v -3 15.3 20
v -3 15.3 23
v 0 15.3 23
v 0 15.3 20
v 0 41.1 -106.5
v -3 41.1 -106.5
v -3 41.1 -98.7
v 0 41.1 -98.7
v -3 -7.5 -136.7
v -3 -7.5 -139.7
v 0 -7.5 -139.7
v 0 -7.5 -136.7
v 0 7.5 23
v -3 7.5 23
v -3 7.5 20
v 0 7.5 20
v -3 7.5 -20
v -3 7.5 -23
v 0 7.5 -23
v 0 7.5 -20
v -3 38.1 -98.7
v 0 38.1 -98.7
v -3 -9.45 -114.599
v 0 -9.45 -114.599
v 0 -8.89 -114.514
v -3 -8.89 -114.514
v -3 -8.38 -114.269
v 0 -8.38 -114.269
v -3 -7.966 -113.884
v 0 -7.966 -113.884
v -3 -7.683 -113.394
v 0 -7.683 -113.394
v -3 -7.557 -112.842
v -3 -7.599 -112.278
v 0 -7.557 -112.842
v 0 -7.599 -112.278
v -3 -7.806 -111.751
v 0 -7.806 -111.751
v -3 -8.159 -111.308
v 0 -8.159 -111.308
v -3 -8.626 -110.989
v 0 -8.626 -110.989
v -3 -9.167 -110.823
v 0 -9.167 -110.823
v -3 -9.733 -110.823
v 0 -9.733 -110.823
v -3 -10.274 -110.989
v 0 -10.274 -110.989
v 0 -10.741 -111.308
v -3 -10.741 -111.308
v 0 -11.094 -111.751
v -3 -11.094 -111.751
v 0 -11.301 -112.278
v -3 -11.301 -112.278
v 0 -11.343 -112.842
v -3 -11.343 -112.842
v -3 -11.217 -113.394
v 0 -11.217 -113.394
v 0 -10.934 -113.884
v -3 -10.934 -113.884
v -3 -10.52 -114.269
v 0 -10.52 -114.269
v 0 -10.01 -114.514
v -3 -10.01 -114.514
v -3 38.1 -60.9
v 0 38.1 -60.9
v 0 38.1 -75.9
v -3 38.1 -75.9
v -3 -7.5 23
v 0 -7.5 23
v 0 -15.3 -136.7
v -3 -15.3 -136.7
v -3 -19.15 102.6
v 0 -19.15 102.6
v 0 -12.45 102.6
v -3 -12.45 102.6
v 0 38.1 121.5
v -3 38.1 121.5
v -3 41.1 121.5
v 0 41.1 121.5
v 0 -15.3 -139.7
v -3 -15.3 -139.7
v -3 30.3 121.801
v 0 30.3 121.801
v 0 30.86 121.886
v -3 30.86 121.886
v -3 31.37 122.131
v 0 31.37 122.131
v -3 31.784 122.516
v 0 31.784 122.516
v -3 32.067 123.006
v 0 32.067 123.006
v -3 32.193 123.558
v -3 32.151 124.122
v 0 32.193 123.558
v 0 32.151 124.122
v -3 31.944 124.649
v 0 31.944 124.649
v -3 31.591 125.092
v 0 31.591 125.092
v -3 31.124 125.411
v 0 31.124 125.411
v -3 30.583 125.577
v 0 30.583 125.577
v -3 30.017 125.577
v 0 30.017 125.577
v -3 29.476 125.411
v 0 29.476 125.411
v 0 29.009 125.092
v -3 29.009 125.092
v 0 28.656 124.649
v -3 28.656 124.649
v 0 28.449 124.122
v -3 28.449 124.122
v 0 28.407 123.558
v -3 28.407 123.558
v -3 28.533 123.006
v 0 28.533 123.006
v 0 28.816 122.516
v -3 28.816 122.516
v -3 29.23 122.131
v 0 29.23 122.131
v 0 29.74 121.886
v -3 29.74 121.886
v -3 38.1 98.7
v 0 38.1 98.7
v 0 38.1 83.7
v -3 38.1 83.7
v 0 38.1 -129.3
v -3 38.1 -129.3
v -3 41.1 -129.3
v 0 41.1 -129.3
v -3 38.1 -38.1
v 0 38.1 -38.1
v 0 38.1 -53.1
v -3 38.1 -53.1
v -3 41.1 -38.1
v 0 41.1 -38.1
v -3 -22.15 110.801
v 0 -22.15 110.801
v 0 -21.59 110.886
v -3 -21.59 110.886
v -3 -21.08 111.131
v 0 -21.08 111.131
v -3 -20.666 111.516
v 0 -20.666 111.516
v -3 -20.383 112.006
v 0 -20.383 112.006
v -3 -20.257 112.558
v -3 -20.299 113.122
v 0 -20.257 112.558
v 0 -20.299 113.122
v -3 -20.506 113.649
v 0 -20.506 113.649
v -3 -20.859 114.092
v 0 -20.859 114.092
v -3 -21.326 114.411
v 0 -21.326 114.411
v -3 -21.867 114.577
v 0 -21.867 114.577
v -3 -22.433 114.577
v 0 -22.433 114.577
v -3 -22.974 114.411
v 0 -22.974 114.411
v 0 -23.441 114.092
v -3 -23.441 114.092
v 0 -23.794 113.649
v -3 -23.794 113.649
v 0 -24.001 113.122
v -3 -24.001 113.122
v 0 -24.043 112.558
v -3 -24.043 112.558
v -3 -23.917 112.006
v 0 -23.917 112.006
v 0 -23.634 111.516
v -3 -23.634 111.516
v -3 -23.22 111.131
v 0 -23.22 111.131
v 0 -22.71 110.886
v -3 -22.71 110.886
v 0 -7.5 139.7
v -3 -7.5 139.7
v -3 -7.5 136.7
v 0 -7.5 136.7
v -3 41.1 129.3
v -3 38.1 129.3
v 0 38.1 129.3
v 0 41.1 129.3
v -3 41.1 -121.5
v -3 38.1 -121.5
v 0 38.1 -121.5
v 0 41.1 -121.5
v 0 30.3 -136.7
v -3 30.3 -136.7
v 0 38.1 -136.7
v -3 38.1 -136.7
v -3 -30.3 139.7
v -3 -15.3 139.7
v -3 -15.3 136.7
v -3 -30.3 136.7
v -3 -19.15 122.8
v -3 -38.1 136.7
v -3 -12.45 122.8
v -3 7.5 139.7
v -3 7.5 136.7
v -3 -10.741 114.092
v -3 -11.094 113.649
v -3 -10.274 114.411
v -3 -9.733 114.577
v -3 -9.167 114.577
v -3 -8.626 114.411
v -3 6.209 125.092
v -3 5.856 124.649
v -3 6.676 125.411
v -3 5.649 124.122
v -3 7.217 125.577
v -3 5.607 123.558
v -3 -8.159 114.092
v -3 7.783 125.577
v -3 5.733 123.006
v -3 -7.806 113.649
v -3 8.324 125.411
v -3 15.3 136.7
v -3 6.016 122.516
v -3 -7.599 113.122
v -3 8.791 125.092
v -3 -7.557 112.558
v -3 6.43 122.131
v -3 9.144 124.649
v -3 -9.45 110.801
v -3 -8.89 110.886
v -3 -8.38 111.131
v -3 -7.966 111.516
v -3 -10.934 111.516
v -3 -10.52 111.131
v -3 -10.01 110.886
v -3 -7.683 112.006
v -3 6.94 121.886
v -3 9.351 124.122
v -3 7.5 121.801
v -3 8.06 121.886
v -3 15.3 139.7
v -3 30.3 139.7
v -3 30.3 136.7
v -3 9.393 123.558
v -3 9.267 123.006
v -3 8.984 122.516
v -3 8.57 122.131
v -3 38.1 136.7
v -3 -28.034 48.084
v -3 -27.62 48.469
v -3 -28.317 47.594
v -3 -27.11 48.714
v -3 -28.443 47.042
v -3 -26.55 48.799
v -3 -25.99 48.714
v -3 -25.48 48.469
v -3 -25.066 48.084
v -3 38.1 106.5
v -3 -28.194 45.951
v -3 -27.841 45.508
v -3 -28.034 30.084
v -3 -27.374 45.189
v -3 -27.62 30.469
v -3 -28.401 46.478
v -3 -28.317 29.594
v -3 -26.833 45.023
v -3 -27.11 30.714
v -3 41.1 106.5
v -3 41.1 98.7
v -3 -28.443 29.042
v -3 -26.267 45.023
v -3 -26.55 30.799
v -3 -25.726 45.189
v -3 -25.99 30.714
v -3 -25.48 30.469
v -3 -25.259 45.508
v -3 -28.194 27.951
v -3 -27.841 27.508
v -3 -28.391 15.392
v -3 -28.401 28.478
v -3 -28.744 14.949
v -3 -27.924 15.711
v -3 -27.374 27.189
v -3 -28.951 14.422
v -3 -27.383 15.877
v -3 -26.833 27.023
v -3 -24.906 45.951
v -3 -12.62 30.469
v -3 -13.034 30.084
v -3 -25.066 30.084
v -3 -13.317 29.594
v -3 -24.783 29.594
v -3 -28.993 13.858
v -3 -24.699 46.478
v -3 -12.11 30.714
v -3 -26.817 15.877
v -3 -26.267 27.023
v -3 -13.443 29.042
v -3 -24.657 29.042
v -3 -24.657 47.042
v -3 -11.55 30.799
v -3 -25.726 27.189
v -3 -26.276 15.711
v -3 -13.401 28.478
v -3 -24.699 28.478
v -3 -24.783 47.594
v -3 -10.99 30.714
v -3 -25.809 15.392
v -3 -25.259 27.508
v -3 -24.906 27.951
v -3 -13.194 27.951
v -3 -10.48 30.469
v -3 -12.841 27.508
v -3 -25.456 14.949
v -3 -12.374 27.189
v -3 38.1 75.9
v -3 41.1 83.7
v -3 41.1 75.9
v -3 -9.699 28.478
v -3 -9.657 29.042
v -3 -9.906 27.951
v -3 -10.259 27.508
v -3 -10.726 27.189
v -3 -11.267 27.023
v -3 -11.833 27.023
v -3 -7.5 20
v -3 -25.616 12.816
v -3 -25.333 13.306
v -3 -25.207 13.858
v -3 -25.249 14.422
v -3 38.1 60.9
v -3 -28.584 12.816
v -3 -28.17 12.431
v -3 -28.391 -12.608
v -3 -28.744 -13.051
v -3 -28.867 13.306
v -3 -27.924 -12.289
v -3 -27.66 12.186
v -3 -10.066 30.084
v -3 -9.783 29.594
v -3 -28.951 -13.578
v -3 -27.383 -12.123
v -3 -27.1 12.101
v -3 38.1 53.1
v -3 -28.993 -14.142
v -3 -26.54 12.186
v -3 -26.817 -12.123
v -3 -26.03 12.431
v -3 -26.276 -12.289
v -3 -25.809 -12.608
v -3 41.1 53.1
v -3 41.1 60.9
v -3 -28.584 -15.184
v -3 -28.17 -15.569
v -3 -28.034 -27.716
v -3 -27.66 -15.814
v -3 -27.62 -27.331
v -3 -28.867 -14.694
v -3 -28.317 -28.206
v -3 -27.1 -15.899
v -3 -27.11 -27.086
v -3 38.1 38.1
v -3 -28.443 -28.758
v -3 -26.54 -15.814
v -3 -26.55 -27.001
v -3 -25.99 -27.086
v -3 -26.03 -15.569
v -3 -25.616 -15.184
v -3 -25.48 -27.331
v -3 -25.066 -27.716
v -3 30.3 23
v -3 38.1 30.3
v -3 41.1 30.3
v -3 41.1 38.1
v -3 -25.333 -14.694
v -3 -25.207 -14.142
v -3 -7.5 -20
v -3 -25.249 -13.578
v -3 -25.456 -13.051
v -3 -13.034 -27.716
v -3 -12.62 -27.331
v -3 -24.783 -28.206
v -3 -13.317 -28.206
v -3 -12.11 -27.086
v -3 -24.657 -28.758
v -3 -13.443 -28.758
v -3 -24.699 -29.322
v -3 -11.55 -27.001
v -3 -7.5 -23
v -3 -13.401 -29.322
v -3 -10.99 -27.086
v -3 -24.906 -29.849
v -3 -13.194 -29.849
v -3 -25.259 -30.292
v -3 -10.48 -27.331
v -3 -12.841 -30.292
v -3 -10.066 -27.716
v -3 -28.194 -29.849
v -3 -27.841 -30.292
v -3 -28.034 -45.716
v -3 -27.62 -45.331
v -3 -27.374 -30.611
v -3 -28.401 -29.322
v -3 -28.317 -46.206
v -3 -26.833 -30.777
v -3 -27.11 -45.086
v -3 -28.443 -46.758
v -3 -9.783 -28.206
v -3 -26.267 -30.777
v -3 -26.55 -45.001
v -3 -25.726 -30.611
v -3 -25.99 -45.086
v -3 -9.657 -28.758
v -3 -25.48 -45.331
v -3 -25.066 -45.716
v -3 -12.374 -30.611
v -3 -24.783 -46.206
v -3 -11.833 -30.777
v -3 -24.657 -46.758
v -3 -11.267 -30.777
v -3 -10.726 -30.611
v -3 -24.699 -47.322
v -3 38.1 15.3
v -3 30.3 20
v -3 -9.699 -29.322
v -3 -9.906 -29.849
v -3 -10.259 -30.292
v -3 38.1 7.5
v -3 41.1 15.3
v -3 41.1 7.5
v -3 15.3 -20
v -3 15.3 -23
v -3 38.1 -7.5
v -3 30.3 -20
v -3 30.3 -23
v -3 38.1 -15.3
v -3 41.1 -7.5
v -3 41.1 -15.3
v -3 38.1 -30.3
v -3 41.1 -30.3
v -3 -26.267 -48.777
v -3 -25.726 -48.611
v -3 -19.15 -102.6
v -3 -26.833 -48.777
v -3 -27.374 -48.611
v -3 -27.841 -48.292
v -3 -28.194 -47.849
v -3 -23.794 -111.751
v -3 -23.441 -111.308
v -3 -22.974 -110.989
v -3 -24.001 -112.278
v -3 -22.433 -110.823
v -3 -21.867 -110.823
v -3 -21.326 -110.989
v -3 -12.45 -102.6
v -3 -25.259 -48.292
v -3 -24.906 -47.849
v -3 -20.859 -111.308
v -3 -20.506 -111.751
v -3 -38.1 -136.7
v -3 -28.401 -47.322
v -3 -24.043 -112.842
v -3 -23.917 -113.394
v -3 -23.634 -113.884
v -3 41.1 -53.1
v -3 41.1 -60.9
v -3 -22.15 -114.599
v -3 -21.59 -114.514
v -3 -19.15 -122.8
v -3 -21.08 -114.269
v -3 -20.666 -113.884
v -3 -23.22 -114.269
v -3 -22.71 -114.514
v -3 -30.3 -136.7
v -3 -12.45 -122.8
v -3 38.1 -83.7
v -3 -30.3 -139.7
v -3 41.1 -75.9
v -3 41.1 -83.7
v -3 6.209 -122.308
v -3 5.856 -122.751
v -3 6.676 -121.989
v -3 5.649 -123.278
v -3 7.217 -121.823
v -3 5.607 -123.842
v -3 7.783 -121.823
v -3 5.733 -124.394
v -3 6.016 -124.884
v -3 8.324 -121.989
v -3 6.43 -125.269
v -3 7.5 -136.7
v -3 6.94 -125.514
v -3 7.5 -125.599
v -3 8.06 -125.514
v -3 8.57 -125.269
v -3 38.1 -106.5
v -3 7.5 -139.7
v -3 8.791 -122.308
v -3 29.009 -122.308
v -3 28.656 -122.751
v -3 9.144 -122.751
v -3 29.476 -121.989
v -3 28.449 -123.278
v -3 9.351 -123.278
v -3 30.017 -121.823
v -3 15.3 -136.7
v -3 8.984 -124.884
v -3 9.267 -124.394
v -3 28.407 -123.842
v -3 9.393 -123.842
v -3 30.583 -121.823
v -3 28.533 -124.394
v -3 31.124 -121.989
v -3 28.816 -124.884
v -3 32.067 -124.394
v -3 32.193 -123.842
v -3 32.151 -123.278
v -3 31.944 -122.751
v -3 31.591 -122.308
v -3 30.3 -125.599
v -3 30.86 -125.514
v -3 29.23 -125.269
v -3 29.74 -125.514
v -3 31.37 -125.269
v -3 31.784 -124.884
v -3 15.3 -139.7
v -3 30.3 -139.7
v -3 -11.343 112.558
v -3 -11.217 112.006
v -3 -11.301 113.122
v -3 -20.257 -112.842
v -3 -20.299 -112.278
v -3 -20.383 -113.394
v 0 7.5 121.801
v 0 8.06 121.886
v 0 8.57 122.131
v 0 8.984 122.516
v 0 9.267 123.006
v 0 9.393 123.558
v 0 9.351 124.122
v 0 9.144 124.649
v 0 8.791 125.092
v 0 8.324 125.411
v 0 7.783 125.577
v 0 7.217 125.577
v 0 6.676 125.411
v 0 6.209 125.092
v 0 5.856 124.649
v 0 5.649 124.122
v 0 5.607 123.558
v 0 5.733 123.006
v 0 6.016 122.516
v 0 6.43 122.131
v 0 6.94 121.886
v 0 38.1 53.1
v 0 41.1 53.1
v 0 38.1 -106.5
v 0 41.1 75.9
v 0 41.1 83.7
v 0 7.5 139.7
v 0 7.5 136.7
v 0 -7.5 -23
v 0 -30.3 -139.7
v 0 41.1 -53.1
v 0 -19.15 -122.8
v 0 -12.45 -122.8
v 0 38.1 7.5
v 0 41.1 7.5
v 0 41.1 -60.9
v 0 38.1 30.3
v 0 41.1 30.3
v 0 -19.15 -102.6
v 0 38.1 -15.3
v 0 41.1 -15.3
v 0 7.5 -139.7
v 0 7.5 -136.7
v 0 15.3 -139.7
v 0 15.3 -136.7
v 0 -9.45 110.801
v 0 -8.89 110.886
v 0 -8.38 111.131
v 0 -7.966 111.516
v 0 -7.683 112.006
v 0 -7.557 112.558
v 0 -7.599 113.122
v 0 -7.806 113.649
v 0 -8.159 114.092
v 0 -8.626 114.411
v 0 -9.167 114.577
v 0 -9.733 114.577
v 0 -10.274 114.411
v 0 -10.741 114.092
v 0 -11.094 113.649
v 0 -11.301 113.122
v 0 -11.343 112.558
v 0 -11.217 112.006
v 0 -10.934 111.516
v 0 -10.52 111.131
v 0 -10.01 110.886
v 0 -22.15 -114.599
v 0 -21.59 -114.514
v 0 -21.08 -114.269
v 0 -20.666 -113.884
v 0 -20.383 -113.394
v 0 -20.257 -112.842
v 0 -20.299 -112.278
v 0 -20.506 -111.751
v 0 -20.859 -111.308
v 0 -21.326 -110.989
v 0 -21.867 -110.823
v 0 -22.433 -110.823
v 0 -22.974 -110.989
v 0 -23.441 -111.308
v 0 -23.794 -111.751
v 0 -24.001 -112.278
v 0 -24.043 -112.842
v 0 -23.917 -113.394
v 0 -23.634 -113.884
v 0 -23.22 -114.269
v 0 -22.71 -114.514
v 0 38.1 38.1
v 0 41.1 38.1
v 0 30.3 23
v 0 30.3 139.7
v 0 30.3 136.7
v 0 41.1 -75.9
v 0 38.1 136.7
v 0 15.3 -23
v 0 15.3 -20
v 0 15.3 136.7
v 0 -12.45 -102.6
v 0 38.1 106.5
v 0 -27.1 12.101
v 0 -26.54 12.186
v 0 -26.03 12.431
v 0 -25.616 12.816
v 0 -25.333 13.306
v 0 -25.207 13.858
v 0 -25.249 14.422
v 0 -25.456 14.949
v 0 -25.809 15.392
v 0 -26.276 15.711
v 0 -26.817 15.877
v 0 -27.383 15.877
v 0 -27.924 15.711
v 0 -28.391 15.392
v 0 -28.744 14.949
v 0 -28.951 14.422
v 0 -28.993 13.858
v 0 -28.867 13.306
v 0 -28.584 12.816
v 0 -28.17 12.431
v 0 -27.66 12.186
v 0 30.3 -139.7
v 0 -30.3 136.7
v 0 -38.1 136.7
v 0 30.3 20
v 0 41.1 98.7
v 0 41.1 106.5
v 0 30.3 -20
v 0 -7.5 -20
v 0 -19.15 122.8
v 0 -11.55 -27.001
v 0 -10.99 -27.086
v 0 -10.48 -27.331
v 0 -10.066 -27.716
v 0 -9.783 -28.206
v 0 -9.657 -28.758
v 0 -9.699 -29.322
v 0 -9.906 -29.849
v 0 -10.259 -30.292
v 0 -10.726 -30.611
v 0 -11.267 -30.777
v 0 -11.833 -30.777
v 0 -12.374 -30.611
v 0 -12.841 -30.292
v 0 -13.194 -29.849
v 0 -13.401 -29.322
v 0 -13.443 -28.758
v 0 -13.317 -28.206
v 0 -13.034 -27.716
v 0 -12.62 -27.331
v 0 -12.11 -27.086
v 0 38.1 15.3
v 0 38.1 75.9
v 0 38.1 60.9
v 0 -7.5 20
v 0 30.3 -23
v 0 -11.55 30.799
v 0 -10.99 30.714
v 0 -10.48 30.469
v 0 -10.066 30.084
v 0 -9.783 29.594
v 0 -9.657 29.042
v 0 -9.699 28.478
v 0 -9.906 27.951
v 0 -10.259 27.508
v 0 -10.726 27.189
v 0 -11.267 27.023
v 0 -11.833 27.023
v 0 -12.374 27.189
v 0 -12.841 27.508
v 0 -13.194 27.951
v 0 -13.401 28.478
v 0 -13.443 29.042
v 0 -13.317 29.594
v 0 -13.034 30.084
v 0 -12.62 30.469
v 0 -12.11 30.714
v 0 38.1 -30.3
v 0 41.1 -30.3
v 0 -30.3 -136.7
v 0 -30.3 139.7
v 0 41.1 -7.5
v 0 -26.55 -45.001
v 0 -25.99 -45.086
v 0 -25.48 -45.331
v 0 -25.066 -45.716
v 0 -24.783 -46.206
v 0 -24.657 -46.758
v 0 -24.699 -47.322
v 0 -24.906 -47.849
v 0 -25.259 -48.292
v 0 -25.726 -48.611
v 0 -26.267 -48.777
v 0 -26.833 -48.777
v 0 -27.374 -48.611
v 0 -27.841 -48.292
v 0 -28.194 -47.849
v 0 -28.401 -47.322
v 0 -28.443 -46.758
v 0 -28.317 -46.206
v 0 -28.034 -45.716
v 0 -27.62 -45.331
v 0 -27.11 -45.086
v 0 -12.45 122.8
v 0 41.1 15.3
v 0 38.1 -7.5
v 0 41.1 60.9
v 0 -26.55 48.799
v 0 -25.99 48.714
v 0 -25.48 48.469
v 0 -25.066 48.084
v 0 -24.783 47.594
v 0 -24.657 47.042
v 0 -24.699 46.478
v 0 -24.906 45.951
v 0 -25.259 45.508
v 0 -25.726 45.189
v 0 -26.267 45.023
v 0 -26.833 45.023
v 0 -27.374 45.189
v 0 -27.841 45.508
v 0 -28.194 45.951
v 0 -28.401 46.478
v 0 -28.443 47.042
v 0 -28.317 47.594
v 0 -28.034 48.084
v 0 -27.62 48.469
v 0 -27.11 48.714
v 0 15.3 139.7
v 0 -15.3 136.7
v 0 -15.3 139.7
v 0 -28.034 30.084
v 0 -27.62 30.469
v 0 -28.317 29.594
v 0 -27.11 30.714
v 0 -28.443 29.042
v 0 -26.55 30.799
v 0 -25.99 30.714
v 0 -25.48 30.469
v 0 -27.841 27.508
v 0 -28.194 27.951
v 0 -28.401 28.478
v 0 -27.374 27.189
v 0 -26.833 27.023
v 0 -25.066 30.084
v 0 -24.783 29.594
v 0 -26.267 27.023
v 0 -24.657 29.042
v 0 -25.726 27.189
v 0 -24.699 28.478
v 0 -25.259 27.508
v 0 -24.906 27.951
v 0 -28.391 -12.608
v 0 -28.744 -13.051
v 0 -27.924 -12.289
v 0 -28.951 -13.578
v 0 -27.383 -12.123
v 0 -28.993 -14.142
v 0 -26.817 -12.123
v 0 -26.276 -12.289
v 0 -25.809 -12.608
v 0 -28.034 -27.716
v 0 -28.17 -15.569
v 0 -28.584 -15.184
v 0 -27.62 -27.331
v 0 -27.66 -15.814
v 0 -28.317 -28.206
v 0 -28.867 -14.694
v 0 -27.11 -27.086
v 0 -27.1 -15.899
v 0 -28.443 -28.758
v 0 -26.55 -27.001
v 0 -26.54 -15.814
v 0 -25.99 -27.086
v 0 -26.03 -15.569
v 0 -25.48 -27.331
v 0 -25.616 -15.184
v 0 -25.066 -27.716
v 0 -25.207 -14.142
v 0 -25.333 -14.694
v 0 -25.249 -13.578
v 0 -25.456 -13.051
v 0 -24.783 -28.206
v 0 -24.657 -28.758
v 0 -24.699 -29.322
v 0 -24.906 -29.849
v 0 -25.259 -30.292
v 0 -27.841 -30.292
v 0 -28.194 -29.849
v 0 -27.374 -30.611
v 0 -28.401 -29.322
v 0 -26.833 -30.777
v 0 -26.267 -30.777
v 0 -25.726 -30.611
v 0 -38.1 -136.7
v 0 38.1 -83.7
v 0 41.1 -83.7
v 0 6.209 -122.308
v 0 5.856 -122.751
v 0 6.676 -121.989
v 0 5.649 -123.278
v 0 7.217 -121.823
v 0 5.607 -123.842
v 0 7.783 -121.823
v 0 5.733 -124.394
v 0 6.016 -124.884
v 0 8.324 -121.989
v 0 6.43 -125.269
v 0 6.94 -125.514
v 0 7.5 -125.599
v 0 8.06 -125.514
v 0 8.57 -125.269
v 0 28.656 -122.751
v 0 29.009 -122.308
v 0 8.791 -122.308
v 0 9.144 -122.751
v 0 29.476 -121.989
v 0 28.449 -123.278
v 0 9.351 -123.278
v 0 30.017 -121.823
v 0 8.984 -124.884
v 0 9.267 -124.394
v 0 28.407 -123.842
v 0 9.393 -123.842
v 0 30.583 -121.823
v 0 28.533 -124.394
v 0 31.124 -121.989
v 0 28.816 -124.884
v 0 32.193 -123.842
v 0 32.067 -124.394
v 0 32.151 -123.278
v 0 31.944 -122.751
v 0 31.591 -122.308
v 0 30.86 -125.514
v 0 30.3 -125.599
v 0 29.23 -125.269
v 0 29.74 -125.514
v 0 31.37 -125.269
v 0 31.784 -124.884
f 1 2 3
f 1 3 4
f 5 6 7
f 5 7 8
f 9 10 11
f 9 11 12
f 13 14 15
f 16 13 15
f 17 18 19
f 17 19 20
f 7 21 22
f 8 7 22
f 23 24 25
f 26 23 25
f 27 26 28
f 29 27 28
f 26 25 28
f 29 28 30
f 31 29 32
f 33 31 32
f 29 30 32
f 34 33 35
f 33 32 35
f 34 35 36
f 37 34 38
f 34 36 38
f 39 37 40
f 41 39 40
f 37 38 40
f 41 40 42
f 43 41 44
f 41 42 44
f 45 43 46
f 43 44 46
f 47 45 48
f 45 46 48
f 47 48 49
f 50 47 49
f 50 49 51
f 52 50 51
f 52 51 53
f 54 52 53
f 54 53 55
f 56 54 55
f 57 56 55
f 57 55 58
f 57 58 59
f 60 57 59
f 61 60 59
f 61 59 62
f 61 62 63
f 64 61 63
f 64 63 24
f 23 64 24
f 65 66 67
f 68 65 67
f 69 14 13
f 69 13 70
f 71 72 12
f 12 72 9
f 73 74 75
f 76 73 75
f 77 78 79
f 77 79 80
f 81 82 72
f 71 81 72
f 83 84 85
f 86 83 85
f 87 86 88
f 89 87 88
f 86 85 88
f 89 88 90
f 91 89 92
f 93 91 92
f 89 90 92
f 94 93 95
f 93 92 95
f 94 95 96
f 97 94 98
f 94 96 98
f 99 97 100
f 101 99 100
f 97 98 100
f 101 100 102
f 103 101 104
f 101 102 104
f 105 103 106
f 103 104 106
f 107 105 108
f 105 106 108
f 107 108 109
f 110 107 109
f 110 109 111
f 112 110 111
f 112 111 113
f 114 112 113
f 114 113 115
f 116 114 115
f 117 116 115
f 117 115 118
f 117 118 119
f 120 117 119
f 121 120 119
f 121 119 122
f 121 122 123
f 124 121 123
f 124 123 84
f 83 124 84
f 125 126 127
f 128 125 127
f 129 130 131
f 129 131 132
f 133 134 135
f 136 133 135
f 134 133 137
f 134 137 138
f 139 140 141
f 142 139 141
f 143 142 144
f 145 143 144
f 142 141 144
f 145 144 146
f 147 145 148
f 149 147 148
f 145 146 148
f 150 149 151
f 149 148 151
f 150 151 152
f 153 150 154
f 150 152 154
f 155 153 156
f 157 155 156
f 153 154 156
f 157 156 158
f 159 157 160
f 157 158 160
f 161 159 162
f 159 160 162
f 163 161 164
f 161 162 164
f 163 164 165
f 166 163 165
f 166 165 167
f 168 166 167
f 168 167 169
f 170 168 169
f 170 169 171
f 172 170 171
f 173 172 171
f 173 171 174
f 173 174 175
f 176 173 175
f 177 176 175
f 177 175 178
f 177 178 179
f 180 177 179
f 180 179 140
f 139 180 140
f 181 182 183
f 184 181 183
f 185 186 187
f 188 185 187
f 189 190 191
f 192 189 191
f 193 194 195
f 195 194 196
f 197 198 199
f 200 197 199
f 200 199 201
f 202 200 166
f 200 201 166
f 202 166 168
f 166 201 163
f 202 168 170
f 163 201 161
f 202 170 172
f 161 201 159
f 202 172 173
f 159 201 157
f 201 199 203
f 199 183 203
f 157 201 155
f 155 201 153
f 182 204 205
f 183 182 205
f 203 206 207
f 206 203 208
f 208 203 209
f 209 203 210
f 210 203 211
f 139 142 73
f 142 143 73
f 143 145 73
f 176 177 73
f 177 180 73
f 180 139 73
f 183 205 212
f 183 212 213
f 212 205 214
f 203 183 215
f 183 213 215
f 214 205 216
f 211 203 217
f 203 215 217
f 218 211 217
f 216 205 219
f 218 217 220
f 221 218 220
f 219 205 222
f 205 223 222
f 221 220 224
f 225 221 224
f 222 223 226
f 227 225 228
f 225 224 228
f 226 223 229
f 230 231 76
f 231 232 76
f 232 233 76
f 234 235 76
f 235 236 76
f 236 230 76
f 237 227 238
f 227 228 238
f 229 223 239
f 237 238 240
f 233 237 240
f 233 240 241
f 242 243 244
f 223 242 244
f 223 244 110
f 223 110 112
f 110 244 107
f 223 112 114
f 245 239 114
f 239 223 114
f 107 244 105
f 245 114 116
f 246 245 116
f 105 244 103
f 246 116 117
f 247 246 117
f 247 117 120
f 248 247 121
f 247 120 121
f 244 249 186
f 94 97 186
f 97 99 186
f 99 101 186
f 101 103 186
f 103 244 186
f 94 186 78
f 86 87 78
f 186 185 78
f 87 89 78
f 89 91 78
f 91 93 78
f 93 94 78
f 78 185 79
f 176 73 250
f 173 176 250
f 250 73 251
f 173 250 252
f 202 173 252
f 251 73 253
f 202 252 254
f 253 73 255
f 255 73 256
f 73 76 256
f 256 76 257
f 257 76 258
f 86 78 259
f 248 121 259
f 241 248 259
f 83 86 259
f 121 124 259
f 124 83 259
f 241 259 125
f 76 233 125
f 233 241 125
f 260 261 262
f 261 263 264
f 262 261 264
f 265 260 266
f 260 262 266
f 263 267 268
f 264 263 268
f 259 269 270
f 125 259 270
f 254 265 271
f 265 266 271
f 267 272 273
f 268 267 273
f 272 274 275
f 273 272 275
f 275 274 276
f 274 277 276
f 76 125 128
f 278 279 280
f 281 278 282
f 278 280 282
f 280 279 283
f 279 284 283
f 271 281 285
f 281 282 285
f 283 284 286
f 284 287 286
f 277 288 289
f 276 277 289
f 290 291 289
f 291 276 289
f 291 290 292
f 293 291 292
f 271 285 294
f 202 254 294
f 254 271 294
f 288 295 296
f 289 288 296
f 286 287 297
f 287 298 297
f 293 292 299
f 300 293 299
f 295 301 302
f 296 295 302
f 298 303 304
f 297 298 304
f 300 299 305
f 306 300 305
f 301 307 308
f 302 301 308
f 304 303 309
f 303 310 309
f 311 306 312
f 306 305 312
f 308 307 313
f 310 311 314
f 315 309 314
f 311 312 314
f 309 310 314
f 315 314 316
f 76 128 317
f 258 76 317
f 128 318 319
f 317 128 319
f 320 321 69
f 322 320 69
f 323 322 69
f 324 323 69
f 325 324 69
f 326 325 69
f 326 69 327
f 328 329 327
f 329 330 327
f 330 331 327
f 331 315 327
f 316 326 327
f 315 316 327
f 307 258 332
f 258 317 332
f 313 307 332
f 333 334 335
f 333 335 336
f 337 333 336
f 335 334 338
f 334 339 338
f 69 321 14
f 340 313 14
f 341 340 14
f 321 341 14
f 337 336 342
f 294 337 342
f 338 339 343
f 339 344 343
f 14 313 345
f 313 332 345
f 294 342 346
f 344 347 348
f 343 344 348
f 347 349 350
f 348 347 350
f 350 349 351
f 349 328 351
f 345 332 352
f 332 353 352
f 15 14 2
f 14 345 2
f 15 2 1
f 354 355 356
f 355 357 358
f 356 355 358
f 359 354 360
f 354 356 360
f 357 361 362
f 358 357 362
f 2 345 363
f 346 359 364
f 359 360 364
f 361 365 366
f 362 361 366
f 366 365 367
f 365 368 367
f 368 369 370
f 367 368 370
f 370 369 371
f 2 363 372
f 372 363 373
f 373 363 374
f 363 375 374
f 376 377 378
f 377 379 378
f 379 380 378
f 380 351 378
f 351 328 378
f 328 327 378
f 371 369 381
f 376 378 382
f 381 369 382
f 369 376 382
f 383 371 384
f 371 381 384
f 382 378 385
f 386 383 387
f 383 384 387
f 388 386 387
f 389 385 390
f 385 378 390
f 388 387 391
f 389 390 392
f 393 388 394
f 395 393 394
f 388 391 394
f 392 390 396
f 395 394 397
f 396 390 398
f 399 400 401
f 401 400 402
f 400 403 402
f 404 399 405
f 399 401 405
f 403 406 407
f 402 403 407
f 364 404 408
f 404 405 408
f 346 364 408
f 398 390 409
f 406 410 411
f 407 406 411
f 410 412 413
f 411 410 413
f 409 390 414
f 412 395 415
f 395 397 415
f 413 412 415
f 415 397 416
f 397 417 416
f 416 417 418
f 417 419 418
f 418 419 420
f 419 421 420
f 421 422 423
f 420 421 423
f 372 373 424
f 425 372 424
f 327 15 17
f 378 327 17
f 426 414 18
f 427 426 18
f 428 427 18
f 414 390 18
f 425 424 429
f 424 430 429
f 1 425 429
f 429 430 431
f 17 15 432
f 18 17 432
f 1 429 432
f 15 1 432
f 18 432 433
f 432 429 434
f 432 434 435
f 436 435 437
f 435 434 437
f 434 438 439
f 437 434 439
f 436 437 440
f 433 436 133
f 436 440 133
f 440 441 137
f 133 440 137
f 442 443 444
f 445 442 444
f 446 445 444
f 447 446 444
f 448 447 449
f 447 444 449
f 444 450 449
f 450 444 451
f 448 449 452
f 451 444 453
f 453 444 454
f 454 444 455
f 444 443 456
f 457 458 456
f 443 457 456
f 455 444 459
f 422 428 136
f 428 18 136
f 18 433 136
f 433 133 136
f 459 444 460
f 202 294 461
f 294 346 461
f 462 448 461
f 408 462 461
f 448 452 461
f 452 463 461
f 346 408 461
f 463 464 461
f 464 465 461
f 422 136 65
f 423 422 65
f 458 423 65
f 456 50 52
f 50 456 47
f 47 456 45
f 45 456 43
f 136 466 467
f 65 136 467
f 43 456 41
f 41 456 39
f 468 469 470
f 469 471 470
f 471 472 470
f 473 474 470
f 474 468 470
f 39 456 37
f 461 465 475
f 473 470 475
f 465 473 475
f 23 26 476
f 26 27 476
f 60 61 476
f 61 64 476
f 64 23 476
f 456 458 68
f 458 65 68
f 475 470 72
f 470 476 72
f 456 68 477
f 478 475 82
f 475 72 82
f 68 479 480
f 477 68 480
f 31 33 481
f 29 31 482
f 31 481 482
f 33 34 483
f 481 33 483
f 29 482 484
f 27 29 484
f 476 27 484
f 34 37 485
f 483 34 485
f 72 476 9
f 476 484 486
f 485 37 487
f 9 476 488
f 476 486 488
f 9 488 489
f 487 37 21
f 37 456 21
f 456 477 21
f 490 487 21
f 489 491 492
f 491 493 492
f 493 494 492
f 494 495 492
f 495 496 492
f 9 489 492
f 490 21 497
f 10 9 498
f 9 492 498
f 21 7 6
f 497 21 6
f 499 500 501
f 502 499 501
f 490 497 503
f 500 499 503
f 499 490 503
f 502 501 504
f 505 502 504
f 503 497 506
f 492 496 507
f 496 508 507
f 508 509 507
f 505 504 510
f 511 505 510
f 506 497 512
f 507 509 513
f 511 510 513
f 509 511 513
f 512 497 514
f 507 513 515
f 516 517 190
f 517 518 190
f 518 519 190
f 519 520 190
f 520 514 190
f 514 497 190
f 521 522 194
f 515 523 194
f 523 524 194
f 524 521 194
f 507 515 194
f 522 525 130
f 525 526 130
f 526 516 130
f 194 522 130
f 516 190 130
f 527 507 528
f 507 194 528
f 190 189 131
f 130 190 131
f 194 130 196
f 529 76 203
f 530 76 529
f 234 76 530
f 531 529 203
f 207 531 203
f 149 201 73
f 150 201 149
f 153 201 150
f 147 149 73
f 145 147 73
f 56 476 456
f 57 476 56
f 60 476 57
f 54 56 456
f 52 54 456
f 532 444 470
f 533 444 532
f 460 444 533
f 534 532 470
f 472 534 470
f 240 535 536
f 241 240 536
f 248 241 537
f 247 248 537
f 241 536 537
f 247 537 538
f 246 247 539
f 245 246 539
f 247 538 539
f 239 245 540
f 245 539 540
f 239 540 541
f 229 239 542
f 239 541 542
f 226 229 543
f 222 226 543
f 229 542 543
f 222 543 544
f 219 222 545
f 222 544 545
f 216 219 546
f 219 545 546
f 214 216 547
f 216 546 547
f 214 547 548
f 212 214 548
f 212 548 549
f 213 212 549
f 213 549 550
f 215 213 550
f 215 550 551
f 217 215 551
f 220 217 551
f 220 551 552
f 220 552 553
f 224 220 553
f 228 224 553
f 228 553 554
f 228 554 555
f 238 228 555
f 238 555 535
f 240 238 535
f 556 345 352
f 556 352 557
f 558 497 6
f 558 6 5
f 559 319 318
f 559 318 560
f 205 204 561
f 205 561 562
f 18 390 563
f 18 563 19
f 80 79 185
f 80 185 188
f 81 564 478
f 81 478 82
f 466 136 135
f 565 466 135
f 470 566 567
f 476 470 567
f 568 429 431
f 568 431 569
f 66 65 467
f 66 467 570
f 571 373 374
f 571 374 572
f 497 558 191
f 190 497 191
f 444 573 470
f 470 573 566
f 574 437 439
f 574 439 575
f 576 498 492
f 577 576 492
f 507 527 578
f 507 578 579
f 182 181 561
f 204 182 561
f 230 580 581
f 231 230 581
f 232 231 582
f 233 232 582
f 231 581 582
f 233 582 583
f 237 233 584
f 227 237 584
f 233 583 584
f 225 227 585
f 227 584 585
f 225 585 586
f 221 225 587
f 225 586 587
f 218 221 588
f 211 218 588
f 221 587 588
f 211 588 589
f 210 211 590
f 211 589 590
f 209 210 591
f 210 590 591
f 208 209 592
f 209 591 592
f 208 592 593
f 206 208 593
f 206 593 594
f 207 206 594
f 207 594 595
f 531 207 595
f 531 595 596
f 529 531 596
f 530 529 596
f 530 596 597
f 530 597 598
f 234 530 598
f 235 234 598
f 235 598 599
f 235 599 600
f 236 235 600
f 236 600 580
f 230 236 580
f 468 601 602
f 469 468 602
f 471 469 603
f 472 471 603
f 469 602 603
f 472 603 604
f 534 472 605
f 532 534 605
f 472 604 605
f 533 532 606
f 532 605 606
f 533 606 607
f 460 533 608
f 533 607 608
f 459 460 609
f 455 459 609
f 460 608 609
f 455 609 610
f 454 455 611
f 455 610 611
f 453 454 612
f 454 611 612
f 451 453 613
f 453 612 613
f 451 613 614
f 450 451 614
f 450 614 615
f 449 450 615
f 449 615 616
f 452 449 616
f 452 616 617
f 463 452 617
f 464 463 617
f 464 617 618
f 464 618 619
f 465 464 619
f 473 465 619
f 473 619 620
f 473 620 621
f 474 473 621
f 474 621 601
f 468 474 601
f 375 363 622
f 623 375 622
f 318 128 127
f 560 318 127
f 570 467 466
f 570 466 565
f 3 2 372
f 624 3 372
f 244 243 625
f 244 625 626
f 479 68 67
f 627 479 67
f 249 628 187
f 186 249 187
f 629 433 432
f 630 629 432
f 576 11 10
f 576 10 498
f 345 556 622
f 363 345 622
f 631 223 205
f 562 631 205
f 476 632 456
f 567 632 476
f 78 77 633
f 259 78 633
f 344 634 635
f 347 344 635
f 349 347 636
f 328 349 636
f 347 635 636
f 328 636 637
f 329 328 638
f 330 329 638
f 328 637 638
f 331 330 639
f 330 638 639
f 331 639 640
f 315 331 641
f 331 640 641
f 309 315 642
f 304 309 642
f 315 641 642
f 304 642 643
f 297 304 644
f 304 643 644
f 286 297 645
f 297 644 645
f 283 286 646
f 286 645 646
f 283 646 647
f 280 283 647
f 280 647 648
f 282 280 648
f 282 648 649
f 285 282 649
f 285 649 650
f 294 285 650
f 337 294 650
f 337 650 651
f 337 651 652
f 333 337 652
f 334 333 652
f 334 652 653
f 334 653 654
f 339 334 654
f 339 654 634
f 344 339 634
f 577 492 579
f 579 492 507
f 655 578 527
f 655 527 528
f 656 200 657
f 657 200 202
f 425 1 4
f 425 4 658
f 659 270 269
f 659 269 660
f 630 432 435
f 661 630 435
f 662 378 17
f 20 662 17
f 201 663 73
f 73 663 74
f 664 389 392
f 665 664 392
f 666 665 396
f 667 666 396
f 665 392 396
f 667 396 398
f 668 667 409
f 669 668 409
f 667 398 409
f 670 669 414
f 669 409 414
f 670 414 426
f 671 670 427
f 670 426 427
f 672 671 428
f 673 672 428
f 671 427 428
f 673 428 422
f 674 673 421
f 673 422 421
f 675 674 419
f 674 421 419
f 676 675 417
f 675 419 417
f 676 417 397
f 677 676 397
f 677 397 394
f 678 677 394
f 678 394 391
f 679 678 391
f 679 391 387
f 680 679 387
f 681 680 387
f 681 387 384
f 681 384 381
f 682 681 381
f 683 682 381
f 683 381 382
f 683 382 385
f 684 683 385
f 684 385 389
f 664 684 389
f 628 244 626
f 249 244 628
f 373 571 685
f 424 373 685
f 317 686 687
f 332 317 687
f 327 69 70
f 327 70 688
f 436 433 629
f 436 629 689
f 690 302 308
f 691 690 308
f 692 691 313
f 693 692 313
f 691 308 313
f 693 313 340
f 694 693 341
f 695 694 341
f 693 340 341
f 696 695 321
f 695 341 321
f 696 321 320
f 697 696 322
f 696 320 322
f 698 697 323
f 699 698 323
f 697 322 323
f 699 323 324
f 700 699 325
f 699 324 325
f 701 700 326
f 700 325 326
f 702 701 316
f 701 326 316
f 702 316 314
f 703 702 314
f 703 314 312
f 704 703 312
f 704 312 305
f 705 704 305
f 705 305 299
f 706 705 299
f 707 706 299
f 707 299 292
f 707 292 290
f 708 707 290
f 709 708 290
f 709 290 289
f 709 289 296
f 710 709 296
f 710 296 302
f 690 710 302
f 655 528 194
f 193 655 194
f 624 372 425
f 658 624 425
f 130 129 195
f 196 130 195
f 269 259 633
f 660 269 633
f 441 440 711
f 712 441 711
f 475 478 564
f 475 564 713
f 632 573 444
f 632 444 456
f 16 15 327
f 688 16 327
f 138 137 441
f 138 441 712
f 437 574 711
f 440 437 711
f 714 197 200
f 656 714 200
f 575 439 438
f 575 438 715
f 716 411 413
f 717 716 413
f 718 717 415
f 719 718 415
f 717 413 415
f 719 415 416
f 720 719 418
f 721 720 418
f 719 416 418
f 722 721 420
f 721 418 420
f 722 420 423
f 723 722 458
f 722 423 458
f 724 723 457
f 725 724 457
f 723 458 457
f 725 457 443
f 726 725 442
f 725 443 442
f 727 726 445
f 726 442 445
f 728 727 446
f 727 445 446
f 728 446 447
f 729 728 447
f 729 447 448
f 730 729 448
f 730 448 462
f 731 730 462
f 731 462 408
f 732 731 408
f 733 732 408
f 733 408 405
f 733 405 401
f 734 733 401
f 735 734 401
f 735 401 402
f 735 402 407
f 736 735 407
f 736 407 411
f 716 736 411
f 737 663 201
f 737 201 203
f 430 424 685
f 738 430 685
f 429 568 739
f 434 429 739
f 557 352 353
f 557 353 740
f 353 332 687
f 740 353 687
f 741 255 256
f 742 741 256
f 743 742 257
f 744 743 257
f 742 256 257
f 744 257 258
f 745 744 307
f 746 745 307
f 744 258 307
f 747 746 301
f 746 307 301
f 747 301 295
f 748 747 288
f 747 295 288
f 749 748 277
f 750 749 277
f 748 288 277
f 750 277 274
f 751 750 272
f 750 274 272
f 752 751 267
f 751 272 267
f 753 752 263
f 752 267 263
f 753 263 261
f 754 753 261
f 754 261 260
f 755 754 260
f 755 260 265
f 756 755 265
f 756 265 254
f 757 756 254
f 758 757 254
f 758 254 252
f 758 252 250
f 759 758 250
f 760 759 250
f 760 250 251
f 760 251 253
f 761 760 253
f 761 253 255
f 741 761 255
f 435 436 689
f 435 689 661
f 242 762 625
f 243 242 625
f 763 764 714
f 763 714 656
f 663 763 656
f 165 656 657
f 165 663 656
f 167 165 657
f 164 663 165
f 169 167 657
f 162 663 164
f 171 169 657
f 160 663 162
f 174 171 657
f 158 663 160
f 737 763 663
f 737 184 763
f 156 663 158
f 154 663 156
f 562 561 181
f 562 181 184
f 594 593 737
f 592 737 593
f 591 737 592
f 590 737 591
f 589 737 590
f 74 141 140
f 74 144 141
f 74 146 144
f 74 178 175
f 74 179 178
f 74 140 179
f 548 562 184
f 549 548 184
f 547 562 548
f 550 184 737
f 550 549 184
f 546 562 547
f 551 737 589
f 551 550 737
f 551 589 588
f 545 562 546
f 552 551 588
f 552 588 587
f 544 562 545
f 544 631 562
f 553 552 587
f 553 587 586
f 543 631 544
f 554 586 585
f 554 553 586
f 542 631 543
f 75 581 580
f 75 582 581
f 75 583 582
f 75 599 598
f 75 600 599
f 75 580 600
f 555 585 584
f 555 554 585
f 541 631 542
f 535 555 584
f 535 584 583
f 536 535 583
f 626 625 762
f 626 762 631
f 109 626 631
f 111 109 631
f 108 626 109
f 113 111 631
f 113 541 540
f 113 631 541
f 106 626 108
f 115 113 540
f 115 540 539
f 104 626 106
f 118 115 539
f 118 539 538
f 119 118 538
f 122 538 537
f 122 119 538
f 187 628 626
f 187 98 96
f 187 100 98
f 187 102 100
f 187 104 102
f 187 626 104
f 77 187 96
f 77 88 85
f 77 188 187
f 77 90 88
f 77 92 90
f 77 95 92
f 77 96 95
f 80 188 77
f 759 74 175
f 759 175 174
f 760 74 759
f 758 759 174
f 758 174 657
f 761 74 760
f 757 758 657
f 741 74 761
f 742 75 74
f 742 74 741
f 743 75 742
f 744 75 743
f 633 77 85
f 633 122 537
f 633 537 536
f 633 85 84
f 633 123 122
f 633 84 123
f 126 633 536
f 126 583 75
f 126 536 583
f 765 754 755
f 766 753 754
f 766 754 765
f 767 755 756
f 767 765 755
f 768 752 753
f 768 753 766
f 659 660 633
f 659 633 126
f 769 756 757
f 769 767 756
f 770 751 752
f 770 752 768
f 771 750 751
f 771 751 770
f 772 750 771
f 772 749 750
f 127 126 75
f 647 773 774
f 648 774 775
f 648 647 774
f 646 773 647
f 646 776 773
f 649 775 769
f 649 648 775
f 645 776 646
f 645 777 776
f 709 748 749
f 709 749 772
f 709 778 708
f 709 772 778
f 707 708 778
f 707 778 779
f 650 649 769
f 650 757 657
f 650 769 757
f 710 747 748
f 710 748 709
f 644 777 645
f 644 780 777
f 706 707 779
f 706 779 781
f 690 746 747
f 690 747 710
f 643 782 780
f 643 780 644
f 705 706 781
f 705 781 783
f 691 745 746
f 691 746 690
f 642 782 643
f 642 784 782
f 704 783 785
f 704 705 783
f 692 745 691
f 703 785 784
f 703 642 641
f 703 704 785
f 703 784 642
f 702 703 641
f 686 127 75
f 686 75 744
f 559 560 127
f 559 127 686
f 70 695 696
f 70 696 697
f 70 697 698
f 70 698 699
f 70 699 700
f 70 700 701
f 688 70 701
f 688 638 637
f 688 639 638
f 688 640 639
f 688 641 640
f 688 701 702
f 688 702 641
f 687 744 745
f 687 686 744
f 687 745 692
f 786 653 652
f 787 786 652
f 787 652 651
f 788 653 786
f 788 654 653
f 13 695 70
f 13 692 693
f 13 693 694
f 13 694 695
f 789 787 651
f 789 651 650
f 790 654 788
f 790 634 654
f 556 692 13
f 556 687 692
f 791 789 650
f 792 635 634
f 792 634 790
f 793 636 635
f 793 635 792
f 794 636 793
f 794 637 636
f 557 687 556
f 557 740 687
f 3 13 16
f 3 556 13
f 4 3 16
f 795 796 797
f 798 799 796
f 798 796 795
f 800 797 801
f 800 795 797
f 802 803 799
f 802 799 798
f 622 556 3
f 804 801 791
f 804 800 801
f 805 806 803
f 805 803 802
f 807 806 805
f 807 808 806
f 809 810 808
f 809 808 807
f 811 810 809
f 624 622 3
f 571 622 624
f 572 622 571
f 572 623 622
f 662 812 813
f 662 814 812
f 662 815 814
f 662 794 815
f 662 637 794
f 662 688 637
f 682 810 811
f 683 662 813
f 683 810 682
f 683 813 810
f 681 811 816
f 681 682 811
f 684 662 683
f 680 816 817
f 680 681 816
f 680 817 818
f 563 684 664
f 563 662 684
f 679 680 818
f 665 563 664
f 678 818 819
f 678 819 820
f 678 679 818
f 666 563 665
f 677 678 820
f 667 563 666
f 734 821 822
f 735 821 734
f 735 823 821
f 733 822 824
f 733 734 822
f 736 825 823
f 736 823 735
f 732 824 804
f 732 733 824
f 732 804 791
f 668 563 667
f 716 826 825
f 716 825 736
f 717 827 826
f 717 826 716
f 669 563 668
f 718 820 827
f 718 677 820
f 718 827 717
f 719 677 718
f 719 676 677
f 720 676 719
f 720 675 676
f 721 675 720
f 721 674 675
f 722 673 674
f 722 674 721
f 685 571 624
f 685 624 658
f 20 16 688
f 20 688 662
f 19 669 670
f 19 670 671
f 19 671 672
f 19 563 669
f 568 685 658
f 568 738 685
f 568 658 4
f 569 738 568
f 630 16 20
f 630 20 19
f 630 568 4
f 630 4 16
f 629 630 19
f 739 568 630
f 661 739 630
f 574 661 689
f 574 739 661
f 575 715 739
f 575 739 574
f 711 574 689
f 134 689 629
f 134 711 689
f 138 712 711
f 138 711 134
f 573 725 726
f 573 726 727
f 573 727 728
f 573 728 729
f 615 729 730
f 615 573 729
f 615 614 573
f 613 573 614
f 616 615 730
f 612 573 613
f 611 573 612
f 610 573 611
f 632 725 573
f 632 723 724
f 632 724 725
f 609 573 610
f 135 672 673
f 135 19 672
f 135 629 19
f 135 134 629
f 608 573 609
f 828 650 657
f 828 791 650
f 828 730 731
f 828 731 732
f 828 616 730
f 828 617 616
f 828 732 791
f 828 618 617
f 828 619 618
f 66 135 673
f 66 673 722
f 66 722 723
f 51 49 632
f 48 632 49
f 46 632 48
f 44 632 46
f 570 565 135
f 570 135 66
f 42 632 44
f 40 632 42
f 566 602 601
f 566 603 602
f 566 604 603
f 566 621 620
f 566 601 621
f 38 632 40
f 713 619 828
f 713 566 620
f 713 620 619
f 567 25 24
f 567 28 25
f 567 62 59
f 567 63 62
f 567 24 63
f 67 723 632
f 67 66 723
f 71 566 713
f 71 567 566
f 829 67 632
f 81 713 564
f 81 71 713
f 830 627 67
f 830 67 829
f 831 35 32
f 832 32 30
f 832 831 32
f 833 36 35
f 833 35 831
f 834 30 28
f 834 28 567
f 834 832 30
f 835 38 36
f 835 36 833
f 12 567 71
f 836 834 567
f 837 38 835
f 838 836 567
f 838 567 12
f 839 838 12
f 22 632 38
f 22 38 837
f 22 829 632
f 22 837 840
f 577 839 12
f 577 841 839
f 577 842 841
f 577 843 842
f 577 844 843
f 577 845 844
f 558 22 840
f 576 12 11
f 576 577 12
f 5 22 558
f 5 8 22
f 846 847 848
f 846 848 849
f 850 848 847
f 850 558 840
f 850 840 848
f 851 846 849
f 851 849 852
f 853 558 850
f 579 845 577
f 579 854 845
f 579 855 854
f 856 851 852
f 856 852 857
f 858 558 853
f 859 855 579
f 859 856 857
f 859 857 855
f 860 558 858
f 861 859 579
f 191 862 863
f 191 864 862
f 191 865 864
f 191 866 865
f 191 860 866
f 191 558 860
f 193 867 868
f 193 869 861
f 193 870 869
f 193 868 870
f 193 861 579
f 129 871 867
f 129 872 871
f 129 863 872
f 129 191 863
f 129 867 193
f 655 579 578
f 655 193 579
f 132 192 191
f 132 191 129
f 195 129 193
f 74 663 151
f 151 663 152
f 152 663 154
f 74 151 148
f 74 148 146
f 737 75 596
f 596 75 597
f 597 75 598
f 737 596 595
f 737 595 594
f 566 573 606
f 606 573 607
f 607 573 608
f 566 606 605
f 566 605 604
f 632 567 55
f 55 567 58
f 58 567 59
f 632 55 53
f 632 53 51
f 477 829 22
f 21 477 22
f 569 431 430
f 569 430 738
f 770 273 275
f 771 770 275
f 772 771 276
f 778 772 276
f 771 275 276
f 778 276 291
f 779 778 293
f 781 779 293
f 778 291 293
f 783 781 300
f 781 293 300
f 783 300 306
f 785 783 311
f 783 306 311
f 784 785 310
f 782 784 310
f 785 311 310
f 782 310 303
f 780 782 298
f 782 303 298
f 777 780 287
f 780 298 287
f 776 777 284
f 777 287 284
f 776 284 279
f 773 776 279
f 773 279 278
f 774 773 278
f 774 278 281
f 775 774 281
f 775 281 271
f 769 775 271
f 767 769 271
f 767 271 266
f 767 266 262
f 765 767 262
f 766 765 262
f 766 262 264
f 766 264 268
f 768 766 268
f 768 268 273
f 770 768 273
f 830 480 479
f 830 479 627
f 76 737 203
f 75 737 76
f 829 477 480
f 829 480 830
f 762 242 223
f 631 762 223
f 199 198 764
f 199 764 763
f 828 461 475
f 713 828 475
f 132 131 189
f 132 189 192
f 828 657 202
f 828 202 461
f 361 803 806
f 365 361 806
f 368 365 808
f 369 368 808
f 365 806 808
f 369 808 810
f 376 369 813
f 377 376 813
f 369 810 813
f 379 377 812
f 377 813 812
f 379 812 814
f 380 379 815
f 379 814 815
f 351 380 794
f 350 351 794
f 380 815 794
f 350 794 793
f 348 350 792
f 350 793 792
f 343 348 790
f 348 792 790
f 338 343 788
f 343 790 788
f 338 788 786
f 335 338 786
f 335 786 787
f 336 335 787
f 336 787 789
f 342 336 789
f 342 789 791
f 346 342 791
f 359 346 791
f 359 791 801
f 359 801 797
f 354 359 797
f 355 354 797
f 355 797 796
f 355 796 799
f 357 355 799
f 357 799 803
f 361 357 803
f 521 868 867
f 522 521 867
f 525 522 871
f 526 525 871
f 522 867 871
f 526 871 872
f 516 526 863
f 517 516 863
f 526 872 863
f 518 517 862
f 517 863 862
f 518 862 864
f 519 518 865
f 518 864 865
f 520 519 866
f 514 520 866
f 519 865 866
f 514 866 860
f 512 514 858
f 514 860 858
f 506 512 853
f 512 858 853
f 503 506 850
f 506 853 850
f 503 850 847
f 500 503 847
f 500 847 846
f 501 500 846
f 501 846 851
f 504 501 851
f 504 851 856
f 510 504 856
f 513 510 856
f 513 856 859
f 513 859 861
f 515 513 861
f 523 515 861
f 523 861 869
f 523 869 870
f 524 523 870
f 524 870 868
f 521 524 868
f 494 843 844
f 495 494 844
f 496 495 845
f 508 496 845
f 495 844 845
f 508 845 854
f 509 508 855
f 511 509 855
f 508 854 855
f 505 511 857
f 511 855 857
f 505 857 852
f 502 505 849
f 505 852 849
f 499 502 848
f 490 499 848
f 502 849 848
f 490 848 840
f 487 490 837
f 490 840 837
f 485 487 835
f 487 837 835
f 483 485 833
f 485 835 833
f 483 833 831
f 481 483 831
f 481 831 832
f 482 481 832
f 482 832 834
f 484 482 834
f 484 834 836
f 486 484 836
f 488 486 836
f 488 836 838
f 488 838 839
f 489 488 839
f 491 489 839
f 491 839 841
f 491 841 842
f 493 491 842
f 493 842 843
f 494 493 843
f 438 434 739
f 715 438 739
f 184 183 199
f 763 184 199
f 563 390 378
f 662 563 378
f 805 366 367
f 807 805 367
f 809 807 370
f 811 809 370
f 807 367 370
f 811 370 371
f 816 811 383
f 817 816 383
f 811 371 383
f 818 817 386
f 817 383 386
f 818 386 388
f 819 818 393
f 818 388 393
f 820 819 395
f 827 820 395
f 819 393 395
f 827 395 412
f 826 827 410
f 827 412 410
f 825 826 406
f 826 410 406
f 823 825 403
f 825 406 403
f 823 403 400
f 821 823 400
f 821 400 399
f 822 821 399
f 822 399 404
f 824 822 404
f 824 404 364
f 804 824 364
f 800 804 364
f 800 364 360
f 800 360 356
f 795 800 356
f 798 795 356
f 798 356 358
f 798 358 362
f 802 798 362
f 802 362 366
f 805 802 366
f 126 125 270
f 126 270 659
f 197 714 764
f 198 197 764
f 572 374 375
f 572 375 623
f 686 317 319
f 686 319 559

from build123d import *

# Parameters (mm, degrees)
SKETCH1_W               = 279.4
SKETCH1_H               = 76.2
BOSS_EXTRUDE1_DEPTH     = 3
SKETCH3_W               = 3
SKETCH3_H               = 7.8
CUT_EXTRUDE1_DEPTH      = 145.833352512
LPATTERN1_COUNT         = 4
LPATTERN1_PITCH         = 22.8
MIRROR1_COPY_1_SKETCH_W = 3
MIRROR1_COPY_1_SKETCH_H = 7.8
MIRROR1_COPY_1_DEPTH    = 145.833352512
MIRROR1_COPY_2_SKETCH_W = 3
MIRROR1_COPY_2_SKETCH_H = 7.8
MIRROR1_COPY_2_DEPTH    = 145.833352512
MIRROR1_COPY_3_SKETCH_W = 3
MIRROR1_COPY_3_SKETCH_H = 7.8
MIRROR1_COPY_3_DEPTH    = 145.833352512
SKETCH5_W               = 3
SKETCH5_H               = 15
CUT_EXTRUDE3_DEPTH      = 10
SKETCH9_W               = 3
SKETCH9_H               = 7.8
BOSS_EXTRUDE2_DEPTH     = 3
LPATTERN4_COUNT         = 12
LPATTERN4_PITCH         = 22.8
LPATTERN5_COUNT         = 2
LPATTERN5_PITCH         = 22.8
MIRROR2_COPY_1_SKETCH_W = 3
MIRROR2_COPY_1_SKETCH_H = 15
MIRROR2_COPY_1_DEPTH    = 10
F_6_CLEARANCE_HOLE1_D   = 3.7973
CUT_EXTRUDE4_REACH      = 147.651
SKETCH12_W              = 20.2
SKETCH12_H              = 6.7
F_6_CLEARANCE_HOLE2_D   = 3.7973
F_6_CLEARANCE_HOLE3_D   = 3.7973
F_6_CLEARANCE_HOLE4_D   = 3.7973


with BuildPart() as part:
    # Sketch1 → Boss-Extrude1 (new body)
    with BuildSketch(Plane(origin=(0, 0, 0), x_dir=(0, 0, -1), z_dir=(1, 0, 0))):
        Rectangle(SKETCH1_W, SKETCH1_H)
    extrude(amount=-BOSS_EXTRUDE1_DEPTH)

    # Sketch3 → Cut-Extrude1 (cut, through all)
    with BuildSketch(Plane.ZY.offset(3)):
        with Locations((-138.2, 34.2)):
            Rectangle(SKETCH3_W, SKETCH3_H)
    cut_extrude1 = extrude(amount=-CUT_EXTRUDE1_DEPTH, mode=Mode.SUBTRACT)

    # LPattern1: Cut-Extrude1 ×4
    with Locations(*[(0, -i * LPATTERN1_PITCH, 0) for i in range(1, LPATTERN1_COUNT)]):
        add(cut_extrude1, mode=Mode.SUBTRACT)

    # Mirror1: Cut-Extrude1 across plane
    add(cut_extrude1.mirror(Plane.XY), mode=Mode.SUBTRACT)

    # Mirror1 copy 1 sketch → Mirror1 copy 1 (cut, through all)
    with BuildSketch(Plane(origin=(-3, -22.8, 0), x_dir=(0, 0, -1), z_dir=(-1, 0, 0))):
        with Locations((-138.2, -34.2)):
            Rectangle(MIRROR1_COPY_1_SKETCH_W, MIRROR1_COPY_1_SKETCH_H)
    extrude(amount=-MIRROR1_COPY_1_DEPTH, mode=Mode.SUBTRACT)

    # Mirror1 copy 2 sketch → Mirror1 copy 2 (cut, through all)
    with BuildSketch(Plane(origin=(-3, -45.6, 0), x_dir=(0, 0, -1), z_dir=(-1, 0, 0))):
        with Locations((-138.2, -34.2)):
            Rectangle(MIRROR1_COPY_2_SKETCH_W, MIRROR1_COPY_2_SKETCH_H)
    extrude(amount=-MIRROR1_COPY_2_DEPTH, mode=Mode.SUBTRACT)

    # Mirror1 copy 3 sketch → Mirror1 copy 3 (cut, through all)
    with BuildSketch(Plane(origin=(-3, -68.4, 0), x_dir=(0, 0, -1), z_dir=(-1, 0, 0))):
        with Locations((-138.2, -34.2)):
            Rectangle(MIRROR1_COPY_3_SKETCH_W, MIRROR1_COPY_3_SKETCH_H)
    extrude(amount=-MIRROR1_COPY_3_DEPTH, mode=Mode.SUBTRACT)

    # Sketch5 → Cut-Extrude3 (cut)
    with BuildSketch(Plane.ZY.offset(3)):
        with Locations((-21.5, 22.8)):
            Rectangle(SKETCH5_W, SKETCH5_H)
    cut_extrude3 = extrude(amount=-CUT_EXTRUDE3_DEPTH, mode=Mode.SUBTRACT)

    # Sketch9 → Boss-Extrude2 (add)
    with BuildSketch(Plane(origin=(0, 38.1, 0), x_dir=(1, 0, 0), z_dir=(0, 1, 0))):
        with Locations((-1.5, 125.4)):
            Rectangle(SKETCH9_W, SKETCH9_H)
    boss_extrude2 = extrude(amount=BOSS_EXTRUDE2_DEPTH)

    # LPattern4: Boss-Extrude2 ×12
    with Locations(*[(0, 0, i * LPATTERN4_PITCH) for i in range(1, LPATTERN4_COUNT)]):
        add(boss_extrude2)

    # LPattern5: Cut-Extrude3 ×2
    with Locations(*[(0, -i * LPATTERN5_PITCH, 0) for i in range(1, LPATTERN5_COUNT)]):
        add(cut_extrude3, mode=Mode.SUBTRACT)

    # Mirror2: Cut-Extrude3 across plane
    add(cut_extrude3.mirror(Plane.XY), mode=Mode.SUBTRACT)

    # Mirror2 copy 1 sketch → Mirror2 copy 1 (cut)
    with BuildSketch(Plane(origin=(-3, -22.8, 0), x_dir=(0, 0, -1), z_dir=(-1, 0, 0))):
        with Locations((-21.5, -22.8)):
            Rectangle(MIRROR2_COPY_1_SKETCH_W, MIRROR2_COPY_1_SKETCH_H)
    extrude(amount=-MIRROR2_COPY_1_DEPTH, mode=Mode.SUBTRACT)

    # #6 Clearance Hole1 (through all)
    with Locations(Plane(origin=(0, 0, 0), x_dir=(0, 0, -1), z_dir=(1, 0, 0))):
        with Locations((-28.9, -11.55), (-28.9, -26.55), (28.9, -26.55), (28.9, -11.55), (-46.9, -26.55), (46.9, -26.55)):
            Hole(F_6_CLEARANCE_HOLE1_D / 2)

    # Sketch12 → Cut-Extrude4 (cut, up to next)
    with BuildSketch(Plane(origin=(0, 0, 0), x_dir=(0, 0, -1), z_dir=(1, 0, 0)), mode=Mode.PRIVATE) as cut_extrude4_sk1:
        with Locations((-112.7, -15.8)):
            Rectangle(SKETCH12_W, SKETCH12_H)
    cut_extrude4_tool1 = extrude(cut_extrude4_sk1.sketch, amount=-CUT_EXTRUDE4_REACH, mode=Mode.PRIVATE) & part.part
    # Sketch12 → Cut-Extrude4 (cut, up to next)
    with BuildSketch(Plane(origin=(0, 0, 0), x_dir=(0, 0, -1), z_dir=(1, 0, 0)), mode=Mode.PRIVATE) as cut_extrude4_sk2:
        with Locations((112.7, -15.8)):
            Rectangle(SKETCH12_W, SKETCH12_H)
    cut_extrude4_tool2 = extrude(cut_extrude4_sk2.sketch, amount=-CUT_EXTRUDE4_REACH, mode=Mode.PRIVATE) & part.part
    add(cut_extrude4_tool1.solids().sort_by_distance((0, -15.8, 112.7))[0], mode=Mode.SUBTRACT)
    add(cut_extrude4_tool2.solids().sort_by_distance((0, -15.8, -112.7))[0], mode=Mode.SUBTRACT)

    # #6 Clearance Hole2 (through all)
    with Locations(Plane.ZY.offset(3)):
        with Locations((-112.7, -9.45), (-112.7, -22.15), (112.7, -22.15), (112.7, -9.45)):
            Hole(F_6_CLEARANCE_HOLE2_D / 2)

    # #6 Clearance Hole3 (through all)
    with Locations(Plane.ZY.offset(3)):
        with Locations((14, -27.1), (-14, -27.1)):
            Hole(F_6_CLEARANCE_HOLE3_D / 2)

    # #6 Clearance Hole4 (through all)
    with Locations(Plane.ZY.offset(3)):
        with Locations((-123.7, 30.3), (-123.7, 7.5), (123.7, 7.5), (123.7, 30.3)):
            Hole(F_6_CLEARANCE_HOLE4_D / 2)


solid = part.part
